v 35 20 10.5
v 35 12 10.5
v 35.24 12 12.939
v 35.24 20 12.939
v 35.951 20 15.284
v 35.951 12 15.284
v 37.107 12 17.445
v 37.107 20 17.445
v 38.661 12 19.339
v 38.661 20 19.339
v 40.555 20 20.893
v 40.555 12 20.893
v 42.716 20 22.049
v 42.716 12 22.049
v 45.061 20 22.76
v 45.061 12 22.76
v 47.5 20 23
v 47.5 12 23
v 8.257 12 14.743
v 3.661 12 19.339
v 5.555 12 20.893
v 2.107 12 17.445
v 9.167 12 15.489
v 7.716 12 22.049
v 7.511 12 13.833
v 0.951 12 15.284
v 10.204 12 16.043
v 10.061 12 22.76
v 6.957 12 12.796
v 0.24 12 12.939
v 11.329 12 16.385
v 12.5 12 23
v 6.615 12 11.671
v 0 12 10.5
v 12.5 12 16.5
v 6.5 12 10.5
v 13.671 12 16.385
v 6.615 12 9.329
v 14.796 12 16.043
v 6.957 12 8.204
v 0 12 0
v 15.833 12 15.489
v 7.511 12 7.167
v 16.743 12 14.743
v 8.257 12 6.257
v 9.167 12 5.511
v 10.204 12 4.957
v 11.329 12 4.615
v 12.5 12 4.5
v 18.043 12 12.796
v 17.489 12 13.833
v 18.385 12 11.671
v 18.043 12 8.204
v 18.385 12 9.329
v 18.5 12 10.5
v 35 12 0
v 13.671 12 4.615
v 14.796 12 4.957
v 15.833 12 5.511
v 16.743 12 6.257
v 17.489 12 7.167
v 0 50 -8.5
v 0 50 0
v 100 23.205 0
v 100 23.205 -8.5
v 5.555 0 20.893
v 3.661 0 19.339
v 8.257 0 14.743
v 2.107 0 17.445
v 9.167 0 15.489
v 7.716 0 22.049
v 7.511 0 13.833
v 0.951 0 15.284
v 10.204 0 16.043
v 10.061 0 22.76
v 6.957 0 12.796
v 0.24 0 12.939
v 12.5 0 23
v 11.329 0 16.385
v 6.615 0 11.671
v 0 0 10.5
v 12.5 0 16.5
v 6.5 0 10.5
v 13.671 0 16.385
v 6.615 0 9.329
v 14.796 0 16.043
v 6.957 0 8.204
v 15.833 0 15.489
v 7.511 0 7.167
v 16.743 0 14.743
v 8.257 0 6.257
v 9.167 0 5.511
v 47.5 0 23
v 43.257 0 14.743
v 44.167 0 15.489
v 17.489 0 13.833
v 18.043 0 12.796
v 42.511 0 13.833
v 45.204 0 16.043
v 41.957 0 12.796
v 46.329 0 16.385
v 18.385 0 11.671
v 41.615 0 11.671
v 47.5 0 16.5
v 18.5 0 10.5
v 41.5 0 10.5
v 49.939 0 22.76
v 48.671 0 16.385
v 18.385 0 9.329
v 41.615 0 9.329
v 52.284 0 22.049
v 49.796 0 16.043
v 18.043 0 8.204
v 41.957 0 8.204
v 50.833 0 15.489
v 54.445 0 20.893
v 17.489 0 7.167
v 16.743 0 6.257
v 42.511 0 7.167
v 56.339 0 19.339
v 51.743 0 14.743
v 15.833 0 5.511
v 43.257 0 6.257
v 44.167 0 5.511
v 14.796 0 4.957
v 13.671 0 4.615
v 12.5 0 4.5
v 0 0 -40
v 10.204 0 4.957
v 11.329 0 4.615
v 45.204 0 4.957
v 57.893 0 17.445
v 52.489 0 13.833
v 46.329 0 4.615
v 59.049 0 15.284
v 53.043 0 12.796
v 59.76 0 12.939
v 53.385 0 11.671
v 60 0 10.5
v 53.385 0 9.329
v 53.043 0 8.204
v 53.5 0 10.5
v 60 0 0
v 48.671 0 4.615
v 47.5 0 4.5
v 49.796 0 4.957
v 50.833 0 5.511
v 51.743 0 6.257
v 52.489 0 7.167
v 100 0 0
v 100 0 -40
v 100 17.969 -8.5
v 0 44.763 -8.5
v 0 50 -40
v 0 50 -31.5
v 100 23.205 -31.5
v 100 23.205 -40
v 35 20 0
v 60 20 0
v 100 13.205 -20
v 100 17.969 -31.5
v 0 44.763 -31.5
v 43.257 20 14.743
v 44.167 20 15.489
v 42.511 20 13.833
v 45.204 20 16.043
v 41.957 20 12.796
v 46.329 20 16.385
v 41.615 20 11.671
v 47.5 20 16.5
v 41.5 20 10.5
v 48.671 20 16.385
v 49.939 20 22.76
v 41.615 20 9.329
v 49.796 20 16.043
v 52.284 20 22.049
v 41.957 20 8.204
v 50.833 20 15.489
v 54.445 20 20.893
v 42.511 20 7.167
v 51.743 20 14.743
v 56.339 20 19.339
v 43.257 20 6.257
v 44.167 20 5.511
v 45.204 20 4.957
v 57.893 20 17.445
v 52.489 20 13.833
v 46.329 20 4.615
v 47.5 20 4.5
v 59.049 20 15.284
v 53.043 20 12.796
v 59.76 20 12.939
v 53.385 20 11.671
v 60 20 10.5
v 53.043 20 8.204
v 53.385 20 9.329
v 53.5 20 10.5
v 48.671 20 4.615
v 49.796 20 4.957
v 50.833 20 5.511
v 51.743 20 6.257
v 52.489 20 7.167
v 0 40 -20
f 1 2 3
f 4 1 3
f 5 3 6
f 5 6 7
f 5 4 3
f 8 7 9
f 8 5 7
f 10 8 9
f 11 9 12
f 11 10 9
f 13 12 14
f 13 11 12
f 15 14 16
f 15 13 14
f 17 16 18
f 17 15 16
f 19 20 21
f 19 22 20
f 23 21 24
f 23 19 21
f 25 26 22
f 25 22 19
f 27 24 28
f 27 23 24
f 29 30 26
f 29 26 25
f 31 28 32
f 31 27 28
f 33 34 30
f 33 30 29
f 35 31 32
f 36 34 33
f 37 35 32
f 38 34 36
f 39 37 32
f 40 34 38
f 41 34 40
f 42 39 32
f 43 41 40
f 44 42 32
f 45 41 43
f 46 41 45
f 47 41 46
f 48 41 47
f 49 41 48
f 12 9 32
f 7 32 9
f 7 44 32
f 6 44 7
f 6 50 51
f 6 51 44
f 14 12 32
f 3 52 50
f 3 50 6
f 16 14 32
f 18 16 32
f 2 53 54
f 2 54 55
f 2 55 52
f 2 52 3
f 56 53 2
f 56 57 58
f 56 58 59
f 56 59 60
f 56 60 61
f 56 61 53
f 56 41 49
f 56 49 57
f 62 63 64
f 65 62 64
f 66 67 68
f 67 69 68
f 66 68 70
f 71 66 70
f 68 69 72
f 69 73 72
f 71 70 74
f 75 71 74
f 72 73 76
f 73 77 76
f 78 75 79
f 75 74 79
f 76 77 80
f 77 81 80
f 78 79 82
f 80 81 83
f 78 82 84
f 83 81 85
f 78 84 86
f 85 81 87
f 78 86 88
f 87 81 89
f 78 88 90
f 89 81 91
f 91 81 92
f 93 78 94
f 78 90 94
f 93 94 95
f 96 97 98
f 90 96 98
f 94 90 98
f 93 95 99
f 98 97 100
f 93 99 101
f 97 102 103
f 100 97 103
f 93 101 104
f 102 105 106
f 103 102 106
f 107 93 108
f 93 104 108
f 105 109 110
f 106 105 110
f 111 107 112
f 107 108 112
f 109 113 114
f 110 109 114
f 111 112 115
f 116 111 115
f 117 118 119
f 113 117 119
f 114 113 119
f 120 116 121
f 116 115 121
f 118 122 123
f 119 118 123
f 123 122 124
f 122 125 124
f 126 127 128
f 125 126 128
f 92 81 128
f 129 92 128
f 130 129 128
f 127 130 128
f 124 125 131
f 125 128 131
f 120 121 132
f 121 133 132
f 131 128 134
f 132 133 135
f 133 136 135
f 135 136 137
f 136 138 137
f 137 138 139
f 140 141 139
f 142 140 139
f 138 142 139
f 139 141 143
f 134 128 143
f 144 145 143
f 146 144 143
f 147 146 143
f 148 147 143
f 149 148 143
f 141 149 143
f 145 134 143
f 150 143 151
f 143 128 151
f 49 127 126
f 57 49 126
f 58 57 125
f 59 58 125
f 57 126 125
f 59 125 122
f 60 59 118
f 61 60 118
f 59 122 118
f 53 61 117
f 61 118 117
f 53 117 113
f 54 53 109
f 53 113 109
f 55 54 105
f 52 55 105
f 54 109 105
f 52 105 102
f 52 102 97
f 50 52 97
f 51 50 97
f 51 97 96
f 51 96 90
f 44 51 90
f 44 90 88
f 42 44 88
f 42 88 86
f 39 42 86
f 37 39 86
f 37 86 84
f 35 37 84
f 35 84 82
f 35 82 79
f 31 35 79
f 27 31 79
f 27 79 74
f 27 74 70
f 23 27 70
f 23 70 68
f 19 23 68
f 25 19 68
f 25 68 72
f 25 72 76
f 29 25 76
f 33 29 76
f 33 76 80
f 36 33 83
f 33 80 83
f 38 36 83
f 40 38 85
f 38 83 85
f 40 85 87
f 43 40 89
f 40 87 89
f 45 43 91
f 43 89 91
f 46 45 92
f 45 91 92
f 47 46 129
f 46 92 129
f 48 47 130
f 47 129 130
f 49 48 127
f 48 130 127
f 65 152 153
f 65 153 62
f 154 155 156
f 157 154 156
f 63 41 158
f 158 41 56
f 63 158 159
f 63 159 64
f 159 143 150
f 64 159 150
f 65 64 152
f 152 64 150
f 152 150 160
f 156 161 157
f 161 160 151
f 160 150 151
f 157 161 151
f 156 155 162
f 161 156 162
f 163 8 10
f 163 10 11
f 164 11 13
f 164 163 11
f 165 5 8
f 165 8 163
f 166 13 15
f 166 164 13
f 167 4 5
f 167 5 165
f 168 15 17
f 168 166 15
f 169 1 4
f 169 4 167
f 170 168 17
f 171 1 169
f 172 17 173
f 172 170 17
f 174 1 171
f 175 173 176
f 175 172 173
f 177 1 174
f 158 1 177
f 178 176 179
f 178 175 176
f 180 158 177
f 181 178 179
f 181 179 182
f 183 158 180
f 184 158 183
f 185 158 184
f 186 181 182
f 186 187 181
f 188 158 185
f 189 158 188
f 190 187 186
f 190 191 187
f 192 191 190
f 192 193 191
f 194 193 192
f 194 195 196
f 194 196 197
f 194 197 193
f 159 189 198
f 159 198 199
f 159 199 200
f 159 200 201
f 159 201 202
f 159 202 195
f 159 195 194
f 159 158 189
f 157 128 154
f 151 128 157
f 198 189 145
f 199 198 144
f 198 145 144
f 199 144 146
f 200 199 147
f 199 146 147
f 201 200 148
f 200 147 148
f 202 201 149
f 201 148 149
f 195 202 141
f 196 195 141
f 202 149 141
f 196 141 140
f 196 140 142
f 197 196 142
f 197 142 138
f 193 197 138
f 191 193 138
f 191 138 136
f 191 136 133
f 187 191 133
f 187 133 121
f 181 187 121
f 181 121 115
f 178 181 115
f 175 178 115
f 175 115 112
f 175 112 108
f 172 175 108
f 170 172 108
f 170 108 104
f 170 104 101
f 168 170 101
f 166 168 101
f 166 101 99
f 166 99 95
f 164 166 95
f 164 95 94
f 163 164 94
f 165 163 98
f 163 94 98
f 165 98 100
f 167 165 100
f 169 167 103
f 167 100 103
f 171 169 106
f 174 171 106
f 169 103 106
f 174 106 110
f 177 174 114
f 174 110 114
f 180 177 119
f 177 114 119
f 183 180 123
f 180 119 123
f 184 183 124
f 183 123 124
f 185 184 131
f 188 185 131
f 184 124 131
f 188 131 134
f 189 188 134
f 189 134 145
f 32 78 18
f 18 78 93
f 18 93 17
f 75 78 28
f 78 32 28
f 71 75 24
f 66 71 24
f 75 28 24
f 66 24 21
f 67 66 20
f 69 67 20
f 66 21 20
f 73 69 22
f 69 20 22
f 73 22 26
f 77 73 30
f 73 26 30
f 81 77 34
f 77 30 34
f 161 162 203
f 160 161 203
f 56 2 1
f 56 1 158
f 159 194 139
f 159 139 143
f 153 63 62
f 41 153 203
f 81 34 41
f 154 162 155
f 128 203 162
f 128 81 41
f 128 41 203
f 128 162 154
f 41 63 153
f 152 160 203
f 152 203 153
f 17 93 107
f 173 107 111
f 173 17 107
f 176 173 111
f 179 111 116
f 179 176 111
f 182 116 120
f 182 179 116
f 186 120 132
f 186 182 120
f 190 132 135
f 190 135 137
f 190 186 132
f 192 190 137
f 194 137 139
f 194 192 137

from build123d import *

# Parameters (mm, degrees)
SKETCH1_W                            = 100
SKETCH1_H                            = 40
BOSS_EXTRUDE1_DEPTH                  = 50
SKETCH1_4_W                          = 35
SKETCH1_4_H                          = 23
BOSS_EXTRUDE2_DEPTH                  = 12
SKETCH1_5_W                          = 25
SKETCH1_5_H                          = 23
BOSS_EXTRUDE3_DEPTH                  = 20
FILLET1_R                            = 12.5
CUT_EXTRUDE1_DEPTH                   = 119.74342087
CUT_EXTRUDE2_DEPTH                   = 123.967511388
F_12_0_12_DIAMETER_HOLE1_D           = 12
F_12_0_12_DIAMETER_HOLE1_ON_FACE_2_D = 12


with BuildPart() as part:
    # Sketch1 → Boss-Extrude1 (new body)
    with BuildSketch(Plane(origin=(0, 0, 0), x_dir=(1, 0, 0), z_dir=(0, 1, 0))):
        with Locations((50, 20)):
            Rectangle(SKETCH1_W, SKETCH1_H)
    extrude(amount=BOSS_EXTRUDE1_DEPTH)

    # Sketch1<4> → Boss-Extrude2 (add)
    with BuildSketch(Plane(origin=(0, 0, 0), x_dir=(1, 0, 0), z_dir=(0, 1, 0))):
        with Locations((17.5, -11.5)):
            Rectangle(SKETCH1_4_W, SKETCH1_4_H)
    extrude(amount=BOSS_EXTRUDE2_DEPTH)

    # Sketch1<5> → Boss-Extrude3 (add)
    with BuildSketch(Plane(origin=(0, 0, 0), x_dir=(1, 0, 0), z_dir=(0, 1, 0))):
        with Locations((47.5, -11.5)):
            Rectangle(SKETCH1_5_W, SKETCH1_5_H)
    extrude(amount=BOSS_EXTRUDE3_DEPTH)

    # Fillet1
    fillet1_edges = [part.edges().sort_by_distance(p)[0] for p in [
        (60, 10, 23),
        (35, 16, 23),
        (0, 6, 23),
    ]]
    fillet(fillet1_edges, radius=FILLET1_R - 0.0001)  # a hair under: the kernel refuses the full size

    # Sketch2 → Cut-Extrude1 (cut, through all)
    with BuildSketch(Plane.XY):
        Polygon((0, 50), (100, 23.205080757), (100, 50), align=None)
    extrude(amount=-CUT_EXTRUDE1_DEPTH, mode=Mode.SUBTRACT)

    # Sketch4 → Cut-Extrude2 (cut, through all, along a direction that is not the sketch's normal)
    with BuildSketch(Plane.ZY):
        Polygon((-31.5, 50), (-31.5, 44.763455967), (-20, 40), (-8.5, 44.763455967), (-8.5, 50), align=None)
    extrude(amount=-CUT_EXTRUDE2_DEPTH, dir=(-0.9659258262890701, 0.2588190451025143, 0), mode=Mode.SUBTRACT)

    # Ø12.0 (12) Diameter Hole1 (through all)
    with Locations(Plane(origin=(12.5, 12, 10.5), x_dir=(0, 0, 1), z_dir=(0, 1, 0))):
        with Locations((0, 0)):
            Hole(F_12_0_12_DIAMETER_HOLE1_D / 2)

    # Ø12.0 (12) Diameter Hole1 on face 2 (through all)
    with Locations(Plane(origin=(47.5, 20, 10.5), x_dir=(0, 0, 1), z_dir=(0, 1, 0))):
        with Locations((0, 0)):
            Hole(F_12_0_12_DIAMETER_HOLE1_ON_FACE_2_D / 2)


solid = part.part
